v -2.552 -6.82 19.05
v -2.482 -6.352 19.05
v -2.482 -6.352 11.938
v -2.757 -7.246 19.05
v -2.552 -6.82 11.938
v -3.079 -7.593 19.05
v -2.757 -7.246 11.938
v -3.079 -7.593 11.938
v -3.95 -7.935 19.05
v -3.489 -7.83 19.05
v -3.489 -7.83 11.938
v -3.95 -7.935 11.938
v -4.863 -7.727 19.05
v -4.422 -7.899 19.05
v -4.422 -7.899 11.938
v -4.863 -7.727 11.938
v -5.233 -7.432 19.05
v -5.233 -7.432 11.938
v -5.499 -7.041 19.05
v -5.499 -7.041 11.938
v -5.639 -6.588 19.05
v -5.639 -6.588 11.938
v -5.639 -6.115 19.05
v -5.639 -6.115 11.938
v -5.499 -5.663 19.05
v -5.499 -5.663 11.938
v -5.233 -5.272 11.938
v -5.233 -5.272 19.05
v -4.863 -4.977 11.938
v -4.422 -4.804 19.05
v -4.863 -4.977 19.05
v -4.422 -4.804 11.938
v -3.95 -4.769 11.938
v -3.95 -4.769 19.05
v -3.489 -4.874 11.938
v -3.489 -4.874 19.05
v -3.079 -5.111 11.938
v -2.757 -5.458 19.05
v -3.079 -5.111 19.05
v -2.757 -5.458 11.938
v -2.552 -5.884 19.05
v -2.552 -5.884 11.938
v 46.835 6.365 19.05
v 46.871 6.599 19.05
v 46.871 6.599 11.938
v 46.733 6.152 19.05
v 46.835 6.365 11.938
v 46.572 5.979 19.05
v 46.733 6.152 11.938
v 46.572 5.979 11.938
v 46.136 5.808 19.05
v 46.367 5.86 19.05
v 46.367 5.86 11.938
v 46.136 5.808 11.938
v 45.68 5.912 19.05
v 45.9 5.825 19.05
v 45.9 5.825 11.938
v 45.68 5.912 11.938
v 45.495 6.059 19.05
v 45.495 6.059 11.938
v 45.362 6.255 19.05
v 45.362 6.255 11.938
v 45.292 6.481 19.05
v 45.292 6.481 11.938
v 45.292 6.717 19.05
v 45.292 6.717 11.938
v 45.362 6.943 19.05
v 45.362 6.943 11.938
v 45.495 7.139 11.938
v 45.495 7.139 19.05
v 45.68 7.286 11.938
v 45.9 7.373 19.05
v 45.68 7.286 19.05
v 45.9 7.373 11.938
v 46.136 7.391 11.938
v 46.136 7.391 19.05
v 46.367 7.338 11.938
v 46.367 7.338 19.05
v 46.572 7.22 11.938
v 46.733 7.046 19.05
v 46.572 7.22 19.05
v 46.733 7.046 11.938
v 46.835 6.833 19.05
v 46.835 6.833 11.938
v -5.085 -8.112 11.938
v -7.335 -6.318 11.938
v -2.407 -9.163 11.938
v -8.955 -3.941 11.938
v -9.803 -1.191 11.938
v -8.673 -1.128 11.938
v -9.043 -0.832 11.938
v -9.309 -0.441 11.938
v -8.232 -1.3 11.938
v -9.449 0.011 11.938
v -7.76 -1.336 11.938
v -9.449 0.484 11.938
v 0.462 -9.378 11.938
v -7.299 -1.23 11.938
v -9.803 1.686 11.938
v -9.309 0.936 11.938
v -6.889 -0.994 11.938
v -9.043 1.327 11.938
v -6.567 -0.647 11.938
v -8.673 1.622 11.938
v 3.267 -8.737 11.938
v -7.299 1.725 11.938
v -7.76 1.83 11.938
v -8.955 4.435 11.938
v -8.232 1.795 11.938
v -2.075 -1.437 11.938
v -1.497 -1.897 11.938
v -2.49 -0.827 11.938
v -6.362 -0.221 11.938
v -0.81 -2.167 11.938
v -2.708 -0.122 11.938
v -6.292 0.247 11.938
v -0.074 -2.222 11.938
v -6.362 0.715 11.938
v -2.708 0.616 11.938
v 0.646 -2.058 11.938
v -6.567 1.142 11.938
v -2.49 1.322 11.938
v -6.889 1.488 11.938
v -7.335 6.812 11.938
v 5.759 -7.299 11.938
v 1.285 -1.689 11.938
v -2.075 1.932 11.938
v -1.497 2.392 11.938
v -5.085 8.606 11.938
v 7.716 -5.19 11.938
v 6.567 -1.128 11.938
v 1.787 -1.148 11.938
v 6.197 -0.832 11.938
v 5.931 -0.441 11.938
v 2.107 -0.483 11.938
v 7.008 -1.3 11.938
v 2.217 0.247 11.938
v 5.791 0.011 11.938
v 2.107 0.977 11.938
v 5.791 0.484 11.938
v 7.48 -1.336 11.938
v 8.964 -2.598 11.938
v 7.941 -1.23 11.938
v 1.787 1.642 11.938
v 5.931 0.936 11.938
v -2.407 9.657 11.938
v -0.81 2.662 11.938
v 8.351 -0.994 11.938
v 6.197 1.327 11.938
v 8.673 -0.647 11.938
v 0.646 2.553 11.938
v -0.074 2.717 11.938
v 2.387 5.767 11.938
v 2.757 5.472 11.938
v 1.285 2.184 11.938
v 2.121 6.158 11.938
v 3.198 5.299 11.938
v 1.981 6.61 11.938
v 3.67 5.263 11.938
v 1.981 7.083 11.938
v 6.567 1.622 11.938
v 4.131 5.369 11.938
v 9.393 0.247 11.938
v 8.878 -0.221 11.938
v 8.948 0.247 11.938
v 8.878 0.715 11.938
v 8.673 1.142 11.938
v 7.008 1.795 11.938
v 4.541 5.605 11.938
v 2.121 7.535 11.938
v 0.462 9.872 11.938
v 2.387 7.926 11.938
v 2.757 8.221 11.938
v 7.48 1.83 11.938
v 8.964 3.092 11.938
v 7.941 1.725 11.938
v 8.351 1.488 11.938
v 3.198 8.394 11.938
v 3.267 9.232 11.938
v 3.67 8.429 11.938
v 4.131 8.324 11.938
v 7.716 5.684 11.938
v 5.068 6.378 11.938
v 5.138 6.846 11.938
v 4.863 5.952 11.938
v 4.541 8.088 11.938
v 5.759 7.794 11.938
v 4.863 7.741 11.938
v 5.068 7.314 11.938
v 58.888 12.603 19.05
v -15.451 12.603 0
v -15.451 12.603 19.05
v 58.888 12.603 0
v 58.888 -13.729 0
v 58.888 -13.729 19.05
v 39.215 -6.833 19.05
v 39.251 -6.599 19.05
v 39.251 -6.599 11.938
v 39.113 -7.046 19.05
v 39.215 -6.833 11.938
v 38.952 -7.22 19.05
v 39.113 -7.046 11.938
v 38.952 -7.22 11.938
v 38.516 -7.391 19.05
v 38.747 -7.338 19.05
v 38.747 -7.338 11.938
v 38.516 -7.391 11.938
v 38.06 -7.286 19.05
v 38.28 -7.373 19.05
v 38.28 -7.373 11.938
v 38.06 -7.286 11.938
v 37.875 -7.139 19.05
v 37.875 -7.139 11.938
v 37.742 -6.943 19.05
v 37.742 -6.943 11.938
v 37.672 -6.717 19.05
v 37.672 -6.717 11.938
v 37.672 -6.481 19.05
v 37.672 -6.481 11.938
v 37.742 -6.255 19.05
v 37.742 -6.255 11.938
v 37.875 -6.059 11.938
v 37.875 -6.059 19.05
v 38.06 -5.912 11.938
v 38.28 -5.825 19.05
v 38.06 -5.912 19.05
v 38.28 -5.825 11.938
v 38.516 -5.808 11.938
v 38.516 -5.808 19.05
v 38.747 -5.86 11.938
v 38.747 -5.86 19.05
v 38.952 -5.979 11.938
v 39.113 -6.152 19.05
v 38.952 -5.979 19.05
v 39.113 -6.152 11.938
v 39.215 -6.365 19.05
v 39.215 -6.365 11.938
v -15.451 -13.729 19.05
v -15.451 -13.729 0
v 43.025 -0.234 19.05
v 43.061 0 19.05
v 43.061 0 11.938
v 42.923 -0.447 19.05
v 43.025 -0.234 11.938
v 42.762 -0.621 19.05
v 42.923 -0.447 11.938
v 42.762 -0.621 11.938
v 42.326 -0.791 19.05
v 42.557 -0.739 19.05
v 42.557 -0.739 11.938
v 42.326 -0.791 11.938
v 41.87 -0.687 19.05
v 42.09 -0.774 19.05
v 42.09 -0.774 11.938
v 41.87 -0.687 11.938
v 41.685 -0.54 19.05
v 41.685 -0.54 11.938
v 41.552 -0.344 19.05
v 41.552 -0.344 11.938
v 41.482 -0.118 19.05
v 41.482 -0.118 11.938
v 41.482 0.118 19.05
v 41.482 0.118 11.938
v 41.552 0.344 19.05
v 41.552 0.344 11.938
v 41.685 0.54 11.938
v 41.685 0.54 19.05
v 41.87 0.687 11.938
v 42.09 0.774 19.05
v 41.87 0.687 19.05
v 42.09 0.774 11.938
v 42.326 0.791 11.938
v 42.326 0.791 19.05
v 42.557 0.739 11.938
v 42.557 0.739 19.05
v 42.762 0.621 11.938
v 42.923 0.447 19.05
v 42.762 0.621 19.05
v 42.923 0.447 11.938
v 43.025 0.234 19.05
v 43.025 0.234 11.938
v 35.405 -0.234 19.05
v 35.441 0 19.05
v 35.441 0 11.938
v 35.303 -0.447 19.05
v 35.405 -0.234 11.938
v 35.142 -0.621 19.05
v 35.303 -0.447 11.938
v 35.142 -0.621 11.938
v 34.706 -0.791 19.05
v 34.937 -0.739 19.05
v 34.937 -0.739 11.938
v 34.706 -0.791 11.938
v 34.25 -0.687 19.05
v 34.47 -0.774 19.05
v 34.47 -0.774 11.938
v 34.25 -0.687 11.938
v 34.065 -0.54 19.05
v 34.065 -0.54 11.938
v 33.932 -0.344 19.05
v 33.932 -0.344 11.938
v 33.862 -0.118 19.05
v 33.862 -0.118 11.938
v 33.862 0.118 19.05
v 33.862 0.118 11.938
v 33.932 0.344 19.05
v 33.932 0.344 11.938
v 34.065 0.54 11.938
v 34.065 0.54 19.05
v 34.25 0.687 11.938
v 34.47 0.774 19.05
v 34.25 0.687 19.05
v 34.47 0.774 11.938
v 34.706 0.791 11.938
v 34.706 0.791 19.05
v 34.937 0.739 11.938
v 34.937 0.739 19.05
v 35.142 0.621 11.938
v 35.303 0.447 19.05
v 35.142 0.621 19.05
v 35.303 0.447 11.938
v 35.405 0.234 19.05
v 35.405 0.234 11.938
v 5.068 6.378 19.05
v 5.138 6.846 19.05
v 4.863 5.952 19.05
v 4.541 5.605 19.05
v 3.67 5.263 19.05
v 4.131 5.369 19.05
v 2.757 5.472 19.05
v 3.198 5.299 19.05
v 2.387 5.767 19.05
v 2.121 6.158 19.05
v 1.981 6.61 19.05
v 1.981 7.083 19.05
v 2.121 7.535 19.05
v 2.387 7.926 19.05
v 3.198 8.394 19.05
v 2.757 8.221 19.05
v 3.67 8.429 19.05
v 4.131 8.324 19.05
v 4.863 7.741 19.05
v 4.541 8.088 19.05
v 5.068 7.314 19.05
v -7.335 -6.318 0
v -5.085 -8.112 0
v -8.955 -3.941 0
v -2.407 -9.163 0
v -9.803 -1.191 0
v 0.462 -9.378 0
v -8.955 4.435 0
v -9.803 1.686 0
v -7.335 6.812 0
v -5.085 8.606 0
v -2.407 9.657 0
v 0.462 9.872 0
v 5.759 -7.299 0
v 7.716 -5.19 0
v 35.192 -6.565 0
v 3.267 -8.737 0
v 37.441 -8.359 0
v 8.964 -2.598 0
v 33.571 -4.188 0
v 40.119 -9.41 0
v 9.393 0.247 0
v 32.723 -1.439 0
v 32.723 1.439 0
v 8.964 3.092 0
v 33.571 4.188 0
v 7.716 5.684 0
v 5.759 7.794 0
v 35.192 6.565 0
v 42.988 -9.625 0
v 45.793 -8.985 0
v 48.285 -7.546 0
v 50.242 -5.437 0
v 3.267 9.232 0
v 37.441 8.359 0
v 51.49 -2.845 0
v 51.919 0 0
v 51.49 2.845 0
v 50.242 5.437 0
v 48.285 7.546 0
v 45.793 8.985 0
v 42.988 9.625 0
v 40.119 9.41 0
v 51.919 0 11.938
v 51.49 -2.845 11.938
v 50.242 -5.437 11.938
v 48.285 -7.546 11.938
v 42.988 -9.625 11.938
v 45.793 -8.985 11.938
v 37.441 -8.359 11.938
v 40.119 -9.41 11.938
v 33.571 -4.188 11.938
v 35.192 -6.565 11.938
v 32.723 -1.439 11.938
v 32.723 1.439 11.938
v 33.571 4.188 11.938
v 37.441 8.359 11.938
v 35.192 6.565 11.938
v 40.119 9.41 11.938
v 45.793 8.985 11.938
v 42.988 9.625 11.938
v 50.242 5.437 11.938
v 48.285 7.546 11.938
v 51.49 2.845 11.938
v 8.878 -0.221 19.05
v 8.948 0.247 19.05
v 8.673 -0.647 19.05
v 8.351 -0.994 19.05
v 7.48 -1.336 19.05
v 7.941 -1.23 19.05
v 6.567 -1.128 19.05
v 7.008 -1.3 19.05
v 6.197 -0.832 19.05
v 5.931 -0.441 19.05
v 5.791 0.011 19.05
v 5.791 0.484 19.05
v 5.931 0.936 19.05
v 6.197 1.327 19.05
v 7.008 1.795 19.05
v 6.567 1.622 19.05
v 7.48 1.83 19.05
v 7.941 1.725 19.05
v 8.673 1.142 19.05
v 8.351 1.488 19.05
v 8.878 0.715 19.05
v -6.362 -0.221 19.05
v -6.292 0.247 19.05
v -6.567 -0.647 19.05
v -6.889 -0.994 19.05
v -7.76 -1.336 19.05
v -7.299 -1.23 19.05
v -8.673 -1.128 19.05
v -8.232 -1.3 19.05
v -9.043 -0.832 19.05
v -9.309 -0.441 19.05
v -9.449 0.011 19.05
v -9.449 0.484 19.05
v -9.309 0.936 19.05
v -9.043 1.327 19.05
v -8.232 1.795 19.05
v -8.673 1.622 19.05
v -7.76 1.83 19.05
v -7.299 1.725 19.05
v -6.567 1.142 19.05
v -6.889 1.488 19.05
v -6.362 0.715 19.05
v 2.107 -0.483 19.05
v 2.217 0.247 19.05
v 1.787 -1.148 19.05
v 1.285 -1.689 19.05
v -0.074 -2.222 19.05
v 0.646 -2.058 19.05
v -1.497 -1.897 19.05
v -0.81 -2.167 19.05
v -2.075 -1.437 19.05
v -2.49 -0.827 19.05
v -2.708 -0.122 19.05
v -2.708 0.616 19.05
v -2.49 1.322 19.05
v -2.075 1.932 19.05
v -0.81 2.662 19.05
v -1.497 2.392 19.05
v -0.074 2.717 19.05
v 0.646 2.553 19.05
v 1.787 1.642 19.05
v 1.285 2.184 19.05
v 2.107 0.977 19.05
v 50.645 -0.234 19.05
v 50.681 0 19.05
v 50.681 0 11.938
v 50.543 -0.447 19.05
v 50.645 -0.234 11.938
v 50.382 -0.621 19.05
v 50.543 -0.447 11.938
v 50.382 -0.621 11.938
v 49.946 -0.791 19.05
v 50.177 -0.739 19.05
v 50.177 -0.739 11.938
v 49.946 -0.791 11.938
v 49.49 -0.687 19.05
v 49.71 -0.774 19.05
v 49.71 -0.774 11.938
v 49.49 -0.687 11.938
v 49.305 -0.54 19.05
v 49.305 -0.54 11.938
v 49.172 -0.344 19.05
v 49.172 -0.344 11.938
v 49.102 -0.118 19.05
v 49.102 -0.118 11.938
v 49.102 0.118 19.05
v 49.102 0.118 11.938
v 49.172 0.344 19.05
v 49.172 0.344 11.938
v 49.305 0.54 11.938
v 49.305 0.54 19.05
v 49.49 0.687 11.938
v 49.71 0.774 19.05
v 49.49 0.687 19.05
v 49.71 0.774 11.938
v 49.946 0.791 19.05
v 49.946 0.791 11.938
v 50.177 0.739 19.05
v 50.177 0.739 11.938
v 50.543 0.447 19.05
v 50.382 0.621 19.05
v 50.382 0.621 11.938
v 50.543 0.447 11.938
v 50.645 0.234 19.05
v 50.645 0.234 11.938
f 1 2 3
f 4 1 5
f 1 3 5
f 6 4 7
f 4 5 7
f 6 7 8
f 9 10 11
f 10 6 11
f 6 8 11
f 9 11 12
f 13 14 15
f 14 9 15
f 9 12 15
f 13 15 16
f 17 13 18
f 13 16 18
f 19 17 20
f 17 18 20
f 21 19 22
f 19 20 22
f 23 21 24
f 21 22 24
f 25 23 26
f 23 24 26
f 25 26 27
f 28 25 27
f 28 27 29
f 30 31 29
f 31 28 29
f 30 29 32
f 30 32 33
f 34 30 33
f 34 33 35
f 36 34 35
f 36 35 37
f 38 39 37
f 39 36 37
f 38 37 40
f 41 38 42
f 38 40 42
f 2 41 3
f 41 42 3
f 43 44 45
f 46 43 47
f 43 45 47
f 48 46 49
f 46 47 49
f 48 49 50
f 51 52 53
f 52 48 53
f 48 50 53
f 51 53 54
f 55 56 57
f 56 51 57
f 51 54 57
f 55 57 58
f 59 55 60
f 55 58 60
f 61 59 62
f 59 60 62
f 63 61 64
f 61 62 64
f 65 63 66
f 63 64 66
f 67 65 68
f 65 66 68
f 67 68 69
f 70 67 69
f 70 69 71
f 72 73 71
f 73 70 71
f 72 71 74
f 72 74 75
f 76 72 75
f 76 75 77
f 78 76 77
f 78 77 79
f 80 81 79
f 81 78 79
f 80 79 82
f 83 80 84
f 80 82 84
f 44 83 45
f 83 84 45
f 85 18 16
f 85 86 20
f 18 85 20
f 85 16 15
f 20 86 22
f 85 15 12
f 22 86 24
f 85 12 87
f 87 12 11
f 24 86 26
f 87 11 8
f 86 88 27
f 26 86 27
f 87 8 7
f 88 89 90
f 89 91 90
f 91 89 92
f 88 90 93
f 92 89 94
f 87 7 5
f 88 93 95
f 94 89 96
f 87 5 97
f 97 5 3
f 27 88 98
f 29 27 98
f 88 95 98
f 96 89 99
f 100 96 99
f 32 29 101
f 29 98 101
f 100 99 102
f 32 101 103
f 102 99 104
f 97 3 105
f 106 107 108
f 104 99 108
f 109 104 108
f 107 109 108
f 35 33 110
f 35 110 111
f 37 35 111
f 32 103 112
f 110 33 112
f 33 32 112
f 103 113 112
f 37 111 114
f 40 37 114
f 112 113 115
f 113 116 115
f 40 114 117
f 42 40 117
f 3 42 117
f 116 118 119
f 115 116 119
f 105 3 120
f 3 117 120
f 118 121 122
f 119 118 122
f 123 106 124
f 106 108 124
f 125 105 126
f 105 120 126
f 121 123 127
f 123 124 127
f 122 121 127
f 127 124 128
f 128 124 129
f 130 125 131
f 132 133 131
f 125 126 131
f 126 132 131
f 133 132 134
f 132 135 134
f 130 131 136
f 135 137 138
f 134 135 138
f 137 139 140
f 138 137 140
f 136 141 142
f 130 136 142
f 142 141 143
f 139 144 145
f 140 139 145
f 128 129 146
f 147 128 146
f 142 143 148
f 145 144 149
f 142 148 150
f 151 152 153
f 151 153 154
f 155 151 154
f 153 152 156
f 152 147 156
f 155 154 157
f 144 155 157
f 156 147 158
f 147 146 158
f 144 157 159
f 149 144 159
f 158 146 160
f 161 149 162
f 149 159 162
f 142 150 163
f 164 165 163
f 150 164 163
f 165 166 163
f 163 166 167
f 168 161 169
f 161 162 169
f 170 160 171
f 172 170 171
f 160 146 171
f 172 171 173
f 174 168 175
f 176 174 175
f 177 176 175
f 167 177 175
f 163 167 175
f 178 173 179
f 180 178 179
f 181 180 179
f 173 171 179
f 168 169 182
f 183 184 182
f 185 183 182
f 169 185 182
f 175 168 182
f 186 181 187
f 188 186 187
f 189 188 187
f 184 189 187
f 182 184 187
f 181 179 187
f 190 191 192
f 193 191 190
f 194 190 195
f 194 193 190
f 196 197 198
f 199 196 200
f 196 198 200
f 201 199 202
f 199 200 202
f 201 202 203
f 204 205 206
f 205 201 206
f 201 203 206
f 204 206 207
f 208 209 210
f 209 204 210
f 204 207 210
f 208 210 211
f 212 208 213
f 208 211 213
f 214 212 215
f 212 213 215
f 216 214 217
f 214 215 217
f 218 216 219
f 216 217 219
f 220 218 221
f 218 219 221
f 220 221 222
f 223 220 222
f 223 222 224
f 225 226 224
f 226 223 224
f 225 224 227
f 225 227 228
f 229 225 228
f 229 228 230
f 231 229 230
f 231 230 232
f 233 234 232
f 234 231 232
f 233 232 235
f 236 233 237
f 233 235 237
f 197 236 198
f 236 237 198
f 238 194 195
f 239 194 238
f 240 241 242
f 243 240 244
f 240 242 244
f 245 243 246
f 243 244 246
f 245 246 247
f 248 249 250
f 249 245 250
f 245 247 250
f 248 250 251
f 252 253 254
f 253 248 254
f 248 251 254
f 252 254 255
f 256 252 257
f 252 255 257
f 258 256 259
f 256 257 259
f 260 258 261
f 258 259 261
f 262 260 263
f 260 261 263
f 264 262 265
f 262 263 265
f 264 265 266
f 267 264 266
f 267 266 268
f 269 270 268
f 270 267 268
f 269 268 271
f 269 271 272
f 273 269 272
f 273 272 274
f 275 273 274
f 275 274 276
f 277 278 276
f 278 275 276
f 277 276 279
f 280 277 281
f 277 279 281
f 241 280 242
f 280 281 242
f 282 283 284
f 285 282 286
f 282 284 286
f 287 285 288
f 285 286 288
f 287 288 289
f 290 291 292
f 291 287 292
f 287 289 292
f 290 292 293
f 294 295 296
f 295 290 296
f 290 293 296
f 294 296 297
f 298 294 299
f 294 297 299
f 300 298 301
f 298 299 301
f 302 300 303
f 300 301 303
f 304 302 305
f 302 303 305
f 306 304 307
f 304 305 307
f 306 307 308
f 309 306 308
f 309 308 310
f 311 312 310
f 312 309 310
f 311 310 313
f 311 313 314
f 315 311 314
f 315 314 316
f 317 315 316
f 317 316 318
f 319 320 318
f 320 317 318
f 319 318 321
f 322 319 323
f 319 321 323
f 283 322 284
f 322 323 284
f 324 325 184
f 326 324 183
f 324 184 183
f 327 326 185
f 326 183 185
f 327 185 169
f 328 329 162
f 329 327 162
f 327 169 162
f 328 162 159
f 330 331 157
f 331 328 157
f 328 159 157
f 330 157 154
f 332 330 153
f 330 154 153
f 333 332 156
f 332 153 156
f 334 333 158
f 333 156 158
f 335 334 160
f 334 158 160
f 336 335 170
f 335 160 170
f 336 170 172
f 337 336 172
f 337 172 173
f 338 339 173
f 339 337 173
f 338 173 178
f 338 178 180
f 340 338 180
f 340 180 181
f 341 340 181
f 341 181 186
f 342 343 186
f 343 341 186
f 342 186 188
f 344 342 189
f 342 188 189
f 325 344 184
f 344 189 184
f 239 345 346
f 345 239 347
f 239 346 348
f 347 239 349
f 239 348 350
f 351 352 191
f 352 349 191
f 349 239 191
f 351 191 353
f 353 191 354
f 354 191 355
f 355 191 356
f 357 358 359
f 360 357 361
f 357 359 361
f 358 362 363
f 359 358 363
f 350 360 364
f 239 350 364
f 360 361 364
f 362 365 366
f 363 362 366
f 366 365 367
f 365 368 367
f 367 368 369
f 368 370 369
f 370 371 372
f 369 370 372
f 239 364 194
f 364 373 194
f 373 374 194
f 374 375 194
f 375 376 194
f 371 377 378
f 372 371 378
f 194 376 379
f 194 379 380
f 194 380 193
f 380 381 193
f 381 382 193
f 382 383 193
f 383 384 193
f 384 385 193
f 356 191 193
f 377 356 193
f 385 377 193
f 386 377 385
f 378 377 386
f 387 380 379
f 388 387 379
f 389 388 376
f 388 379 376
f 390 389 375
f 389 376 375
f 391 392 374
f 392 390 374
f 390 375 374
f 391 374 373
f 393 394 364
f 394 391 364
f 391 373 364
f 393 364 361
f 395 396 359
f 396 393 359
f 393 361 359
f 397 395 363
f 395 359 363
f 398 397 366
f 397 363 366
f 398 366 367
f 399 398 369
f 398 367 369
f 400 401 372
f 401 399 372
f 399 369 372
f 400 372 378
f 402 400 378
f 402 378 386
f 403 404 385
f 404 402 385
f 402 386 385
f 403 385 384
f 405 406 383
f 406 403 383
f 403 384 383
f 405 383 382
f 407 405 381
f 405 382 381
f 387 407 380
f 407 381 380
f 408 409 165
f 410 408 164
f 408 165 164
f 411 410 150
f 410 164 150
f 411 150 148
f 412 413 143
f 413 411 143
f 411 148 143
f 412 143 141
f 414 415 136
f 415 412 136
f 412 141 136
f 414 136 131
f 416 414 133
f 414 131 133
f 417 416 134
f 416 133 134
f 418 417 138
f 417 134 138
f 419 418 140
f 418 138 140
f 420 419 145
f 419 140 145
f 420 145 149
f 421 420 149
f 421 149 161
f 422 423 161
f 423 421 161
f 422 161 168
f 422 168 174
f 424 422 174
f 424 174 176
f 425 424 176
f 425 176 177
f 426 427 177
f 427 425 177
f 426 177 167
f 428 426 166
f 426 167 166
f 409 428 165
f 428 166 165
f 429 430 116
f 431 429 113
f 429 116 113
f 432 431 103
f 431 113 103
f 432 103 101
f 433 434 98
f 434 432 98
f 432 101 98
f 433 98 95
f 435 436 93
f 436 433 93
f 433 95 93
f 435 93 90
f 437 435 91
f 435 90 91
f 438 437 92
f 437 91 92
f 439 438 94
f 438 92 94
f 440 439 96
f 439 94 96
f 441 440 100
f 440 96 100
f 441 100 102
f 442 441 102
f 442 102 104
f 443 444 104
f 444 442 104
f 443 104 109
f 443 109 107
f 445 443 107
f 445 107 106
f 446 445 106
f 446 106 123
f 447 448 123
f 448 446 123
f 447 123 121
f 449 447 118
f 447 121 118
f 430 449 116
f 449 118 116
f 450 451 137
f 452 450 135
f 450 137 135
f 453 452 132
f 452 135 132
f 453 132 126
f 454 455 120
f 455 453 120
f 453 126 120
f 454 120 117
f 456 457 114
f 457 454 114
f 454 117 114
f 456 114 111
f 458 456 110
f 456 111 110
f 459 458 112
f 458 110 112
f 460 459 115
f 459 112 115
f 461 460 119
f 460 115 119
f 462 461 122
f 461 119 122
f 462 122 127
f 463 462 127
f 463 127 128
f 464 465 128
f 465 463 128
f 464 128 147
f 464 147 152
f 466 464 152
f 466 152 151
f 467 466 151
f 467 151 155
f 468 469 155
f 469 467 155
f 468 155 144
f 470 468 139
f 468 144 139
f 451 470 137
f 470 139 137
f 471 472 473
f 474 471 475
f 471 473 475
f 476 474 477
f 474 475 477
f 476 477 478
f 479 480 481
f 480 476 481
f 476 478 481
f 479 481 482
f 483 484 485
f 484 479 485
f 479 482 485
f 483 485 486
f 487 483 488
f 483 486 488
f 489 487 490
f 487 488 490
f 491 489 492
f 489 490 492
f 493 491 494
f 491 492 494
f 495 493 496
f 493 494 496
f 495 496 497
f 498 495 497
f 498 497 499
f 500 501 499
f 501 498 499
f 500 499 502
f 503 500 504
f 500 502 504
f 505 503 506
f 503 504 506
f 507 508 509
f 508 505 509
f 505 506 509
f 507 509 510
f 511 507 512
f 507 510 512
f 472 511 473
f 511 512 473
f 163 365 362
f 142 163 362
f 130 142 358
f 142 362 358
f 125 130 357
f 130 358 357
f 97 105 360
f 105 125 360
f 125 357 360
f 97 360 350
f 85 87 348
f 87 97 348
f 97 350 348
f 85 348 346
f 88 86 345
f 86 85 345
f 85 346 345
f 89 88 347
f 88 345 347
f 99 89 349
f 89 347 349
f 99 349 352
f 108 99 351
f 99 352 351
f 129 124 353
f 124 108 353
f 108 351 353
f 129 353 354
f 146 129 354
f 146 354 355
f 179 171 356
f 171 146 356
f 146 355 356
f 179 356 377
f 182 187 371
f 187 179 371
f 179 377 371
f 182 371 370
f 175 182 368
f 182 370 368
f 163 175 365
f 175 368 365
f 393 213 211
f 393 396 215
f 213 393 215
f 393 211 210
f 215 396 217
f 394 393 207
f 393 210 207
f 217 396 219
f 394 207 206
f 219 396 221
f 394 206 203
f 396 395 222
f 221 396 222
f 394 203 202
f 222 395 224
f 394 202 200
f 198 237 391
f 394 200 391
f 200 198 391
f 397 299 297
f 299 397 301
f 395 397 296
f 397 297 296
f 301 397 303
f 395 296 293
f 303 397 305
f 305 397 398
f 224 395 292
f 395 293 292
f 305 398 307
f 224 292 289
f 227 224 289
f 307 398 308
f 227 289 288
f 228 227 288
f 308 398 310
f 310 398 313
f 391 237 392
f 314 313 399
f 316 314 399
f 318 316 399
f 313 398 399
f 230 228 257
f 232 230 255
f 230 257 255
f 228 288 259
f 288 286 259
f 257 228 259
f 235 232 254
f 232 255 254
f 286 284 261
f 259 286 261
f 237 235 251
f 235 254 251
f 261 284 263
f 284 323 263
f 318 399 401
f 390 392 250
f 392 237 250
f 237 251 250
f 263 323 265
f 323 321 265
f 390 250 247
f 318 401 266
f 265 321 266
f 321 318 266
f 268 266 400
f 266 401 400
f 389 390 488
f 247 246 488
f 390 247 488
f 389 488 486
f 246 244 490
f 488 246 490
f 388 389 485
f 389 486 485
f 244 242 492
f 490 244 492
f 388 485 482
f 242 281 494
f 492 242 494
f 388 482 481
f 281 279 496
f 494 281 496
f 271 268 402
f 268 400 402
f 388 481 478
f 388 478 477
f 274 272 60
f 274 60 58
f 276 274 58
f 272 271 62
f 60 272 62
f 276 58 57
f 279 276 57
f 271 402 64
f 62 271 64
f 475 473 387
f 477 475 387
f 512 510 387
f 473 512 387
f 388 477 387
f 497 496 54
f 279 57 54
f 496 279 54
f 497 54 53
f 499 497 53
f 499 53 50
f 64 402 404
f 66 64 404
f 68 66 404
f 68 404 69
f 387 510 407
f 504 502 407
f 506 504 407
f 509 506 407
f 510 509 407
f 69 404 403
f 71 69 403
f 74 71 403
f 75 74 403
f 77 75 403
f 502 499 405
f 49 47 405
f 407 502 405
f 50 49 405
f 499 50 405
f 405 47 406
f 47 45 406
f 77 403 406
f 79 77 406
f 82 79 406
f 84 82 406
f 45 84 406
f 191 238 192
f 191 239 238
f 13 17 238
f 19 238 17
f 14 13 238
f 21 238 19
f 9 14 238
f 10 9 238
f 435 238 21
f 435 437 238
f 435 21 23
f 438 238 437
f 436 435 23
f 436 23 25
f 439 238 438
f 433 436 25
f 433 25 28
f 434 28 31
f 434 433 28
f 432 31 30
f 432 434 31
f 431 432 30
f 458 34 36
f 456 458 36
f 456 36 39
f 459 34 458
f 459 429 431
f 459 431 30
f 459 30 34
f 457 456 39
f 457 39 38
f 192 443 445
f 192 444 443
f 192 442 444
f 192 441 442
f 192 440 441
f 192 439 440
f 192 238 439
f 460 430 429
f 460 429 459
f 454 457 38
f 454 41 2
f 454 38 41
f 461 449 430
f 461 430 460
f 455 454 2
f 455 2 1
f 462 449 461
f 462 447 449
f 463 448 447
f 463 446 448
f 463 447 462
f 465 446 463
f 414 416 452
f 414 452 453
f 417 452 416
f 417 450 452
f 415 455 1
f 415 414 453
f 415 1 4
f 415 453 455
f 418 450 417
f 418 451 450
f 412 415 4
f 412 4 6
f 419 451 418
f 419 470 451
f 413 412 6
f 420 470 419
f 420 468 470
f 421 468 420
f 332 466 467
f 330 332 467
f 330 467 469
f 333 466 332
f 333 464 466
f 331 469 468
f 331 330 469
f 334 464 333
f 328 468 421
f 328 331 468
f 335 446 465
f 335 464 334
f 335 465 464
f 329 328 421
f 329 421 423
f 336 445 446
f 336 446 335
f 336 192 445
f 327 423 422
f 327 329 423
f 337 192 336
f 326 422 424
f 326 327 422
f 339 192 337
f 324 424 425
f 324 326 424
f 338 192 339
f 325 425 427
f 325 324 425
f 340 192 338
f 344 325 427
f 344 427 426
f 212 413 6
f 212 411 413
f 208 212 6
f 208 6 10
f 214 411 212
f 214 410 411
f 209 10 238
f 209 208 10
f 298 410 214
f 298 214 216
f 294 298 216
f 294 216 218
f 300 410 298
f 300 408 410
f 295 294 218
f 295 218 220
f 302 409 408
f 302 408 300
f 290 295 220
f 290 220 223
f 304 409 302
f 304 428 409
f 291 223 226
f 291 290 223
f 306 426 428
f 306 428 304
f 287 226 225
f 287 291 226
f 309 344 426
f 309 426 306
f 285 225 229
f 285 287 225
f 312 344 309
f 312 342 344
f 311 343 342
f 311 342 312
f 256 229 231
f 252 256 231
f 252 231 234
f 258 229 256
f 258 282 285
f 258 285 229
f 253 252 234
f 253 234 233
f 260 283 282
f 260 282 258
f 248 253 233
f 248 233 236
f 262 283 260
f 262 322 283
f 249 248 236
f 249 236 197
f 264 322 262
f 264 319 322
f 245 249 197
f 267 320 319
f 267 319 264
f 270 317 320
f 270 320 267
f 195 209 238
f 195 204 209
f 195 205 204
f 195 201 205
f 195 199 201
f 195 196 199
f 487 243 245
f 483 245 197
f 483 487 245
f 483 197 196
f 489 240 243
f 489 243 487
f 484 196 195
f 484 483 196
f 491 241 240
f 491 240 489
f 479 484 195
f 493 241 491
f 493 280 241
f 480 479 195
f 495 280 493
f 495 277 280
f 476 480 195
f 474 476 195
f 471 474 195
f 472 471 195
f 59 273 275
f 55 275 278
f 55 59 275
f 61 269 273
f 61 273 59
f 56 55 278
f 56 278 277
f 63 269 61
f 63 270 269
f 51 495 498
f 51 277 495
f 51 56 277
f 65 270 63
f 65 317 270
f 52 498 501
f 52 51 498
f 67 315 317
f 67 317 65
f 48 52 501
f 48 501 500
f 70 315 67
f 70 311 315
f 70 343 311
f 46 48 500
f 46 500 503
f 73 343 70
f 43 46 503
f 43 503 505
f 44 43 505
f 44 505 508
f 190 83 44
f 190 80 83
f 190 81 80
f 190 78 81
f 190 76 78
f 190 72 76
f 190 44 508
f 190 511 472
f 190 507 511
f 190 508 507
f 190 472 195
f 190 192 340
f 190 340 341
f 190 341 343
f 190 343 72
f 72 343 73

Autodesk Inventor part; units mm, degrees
ref_plane "YZ Plane" through (0, 0, 0) normal (1, 0, 0) x (0, 1, 0)
ref_plane "XZ Plane" through (0, 0, 0) normal (0, 1, 0) x (-1, 0, 0)
ref_plane "XY Plane" through (0, 0, 0) normal (0, 0, 1) x (1, 0, 0)
sketch "Sketch1" plane through (0, 0, 0) normal (0, 0, 1) x (1, 0, 0)
  circle A0 centre (49.887, 0) radius 0.7937
  circle A1 centre (34.647, 0) radius 0.7937
  circle A2 centre (42.267, 0) radius 9.525
  circle A3 centre (38.457, -6.5991) radius 0.7937
  circle A4 centre (46.077, 6.5991) radius 0.7937
  circle A5 centre (42.267, 0) radius 0.7937
  line L0 (-15.4509, 12.6033) -> (58.8878, 12.6033)
  line L1 (58.8878, 12.6033) -> (58.8878, -13.7292)
  line L2 (58.8878, -13.7292) -> (-15.4509, -13.7292)
  line L3 (-15.4509, -13.7292) -> (-15.4509, 12.6033)
  circle A6 centre (7.3609, 0.2473) radius 1.5875
  circle A7 centre (-7.8791, 0.2473) radius 1.5875
  circle A8 centre (-0.2591, 0.2473) radius 9.525
  circle A9 centre (3.5509, 6.8464) radius 1.5875
  circle A10 centre (-4.0691, -6.3518) radius 1.5875
  circle A11 centre (-0.2591, 0.2473) radius 2.4765
  circle A12 centre (42.267, 0) radius 9.652
  circle A13 centre (-0.2591, 0.2473) radius 9.652
  point P0 (37.5045, -8.2489)
  point P1 (47.0295, 8.2489)
  point P2 (-5.0216, -8.0016)
  point P3 (4.5034, 8.4962)
  dimension "d69" = 1.5875
  dimension "d70" = 1.5875
  dimension "d75" = 1.5875
  dimension "d76" = 1.5875
  dimension "d79" = 7.62
  dimension "d80" = 7.62
  dimension "d82" = 1.5875
  dimension "d83" = 7.62
  dimension "d84" = 7.62
  dimension "d85" = 3.175
  dimension "d86" = 3.175
  dimension "d87" = 3.175
  dimension "d88" = 3.175
  dimension "d89" = 7.62
  dimension "d90" = 7.62
  dimension "d91" = 4.953
  dimension "d92" = 7.62
  dimension "d93" = 7.62
  dimension "d95" = 19.304
  dimension "d96" = 19.304
extrude "Extrusion14" add sketch "Sketch1" along normal blind 19.05 contours A2 | L0 L1 L2 L3 | A8 | A12 | A13
extrude "Extrusion15" cut sketch "Sketch1" along normal blind 11.938 contours A0 | A1 | A2 | A3 | A4 | A5 | A6 | A7 | A8 | A9 | A10 | A11 | A12 | A13
properties part number "C.Crank Connect Shaft Cutting Jig"
